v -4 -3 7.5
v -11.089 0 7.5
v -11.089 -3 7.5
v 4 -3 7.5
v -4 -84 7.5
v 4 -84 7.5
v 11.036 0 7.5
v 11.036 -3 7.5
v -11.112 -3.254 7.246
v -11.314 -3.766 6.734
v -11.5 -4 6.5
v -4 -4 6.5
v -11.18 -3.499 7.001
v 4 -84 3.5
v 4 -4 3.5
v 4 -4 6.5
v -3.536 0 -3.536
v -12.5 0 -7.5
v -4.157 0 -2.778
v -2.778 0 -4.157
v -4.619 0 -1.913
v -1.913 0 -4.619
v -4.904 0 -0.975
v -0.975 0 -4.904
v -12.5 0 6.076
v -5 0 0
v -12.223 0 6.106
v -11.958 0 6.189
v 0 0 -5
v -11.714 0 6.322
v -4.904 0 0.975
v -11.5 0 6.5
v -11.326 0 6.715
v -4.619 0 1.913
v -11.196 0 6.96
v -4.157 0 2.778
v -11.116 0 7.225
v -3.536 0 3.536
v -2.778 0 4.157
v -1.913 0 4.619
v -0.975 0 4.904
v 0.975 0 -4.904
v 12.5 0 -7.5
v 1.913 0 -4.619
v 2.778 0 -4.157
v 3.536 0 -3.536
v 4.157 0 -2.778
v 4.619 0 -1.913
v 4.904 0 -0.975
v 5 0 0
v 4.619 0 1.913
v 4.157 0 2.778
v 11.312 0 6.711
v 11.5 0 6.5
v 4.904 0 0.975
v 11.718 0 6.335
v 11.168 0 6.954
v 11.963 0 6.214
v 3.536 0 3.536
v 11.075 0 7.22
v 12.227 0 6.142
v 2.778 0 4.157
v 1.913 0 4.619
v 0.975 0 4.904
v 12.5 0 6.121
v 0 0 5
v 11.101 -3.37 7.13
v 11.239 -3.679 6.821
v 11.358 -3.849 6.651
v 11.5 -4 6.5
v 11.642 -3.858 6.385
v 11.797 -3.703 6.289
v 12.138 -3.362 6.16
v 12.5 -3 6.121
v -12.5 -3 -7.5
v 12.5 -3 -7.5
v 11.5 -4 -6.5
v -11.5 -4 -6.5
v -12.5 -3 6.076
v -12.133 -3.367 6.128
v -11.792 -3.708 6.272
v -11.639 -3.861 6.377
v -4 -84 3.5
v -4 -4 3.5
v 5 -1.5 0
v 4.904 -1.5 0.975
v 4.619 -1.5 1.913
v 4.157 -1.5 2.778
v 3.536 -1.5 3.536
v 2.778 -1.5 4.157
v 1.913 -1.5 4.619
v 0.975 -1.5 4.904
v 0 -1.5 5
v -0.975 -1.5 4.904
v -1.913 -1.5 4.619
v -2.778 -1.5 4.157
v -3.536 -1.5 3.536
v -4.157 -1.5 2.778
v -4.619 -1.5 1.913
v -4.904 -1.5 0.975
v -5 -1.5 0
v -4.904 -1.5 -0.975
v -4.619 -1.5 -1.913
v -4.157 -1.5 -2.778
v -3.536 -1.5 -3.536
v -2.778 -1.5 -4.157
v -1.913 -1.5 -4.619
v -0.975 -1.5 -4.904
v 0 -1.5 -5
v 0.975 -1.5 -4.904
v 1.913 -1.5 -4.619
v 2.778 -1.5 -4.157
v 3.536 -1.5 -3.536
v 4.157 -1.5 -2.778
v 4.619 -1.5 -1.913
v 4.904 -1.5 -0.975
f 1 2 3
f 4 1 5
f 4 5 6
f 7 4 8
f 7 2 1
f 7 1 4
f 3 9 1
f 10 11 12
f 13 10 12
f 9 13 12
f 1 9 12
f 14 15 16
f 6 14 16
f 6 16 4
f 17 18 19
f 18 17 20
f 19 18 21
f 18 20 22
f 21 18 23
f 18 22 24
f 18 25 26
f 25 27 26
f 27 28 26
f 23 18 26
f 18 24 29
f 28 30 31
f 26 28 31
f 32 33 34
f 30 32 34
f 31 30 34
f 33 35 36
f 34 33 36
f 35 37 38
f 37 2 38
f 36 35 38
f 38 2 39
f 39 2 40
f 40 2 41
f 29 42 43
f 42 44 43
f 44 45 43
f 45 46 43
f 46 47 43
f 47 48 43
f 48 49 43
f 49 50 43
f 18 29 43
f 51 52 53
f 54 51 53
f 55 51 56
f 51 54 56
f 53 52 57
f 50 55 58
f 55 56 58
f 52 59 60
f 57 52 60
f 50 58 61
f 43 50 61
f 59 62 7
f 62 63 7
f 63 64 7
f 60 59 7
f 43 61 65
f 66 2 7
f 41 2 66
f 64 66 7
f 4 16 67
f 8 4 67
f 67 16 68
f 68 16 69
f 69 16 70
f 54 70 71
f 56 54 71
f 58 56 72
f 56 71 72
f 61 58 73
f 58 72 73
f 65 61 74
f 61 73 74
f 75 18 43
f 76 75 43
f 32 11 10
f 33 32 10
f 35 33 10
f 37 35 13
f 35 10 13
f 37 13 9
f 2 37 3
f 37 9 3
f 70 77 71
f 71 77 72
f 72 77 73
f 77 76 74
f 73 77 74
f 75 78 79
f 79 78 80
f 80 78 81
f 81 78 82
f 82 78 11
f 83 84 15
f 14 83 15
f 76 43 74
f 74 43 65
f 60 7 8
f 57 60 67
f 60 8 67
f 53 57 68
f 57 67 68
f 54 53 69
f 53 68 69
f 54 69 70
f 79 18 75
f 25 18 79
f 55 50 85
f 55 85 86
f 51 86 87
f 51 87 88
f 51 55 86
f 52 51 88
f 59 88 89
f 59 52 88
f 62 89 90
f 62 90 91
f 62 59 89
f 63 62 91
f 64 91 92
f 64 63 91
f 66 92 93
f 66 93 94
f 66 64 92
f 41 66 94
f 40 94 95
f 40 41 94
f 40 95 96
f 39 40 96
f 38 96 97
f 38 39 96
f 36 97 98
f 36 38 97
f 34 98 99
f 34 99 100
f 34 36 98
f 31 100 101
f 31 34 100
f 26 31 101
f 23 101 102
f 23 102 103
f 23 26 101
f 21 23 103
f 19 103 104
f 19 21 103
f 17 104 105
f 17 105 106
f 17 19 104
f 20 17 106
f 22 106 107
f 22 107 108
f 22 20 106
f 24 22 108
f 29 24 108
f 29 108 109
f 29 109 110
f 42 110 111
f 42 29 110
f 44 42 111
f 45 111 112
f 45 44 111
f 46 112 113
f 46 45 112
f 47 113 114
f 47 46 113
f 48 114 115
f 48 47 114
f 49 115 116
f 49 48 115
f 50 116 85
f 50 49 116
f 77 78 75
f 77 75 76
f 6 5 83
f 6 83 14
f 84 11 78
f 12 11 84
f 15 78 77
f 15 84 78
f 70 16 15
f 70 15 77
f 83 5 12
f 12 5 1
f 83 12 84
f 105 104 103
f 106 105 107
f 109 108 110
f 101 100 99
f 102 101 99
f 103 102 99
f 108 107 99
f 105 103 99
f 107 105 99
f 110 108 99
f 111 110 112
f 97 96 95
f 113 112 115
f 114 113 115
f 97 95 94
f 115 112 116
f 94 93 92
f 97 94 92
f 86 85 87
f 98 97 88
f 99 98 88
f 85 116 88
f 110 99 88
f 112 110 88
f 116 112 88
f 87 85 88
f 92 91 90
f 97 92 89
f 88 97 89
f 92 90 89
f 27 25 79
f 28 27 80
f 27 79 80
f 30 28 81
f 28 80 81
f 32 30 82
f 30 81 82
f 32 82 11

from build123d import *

# Parameters (mm, degrees)
F0_W     = 25
F0_H     = 15
F1_DEPTH = 4
F2_R     = 5
F3_DEPTH = 1.5
F5_DEPTH = 80
F6_SIZE  = 1
F8_DEPTH = 25


with BuildPart() as f1:
    # F0 (on Front) → F1 (new body)
    with BuildSketch(Plane.XZ):
        Rectangle(F0_W, F0_H)
    extrude(amount=F1_DEPTH)

    # F2 (on Front) → F3 (cut)
    with BuildSketch(Plane.XZ):
        Circle(F2_R)
    extrude(amount=F3_DEPTH, mode=Mode.SUBTRACT)

    # F4 (on face) → F5 (join)
    with BuildSketch(Plane.XZ.offset(4)):
        Polygon((4, 7.5), (0, 7.5), (-4, 7.5), (-4, 3.5), (4, 3.5), align=None)
    extrude(amount=F5_DEPTH)

    # F6
    f6_edges = [f1.edges().sort_by_distance(p)[0] for p in [
        (8.25, -4, 7.5),
        (-8.25, -4, 7.5),
        (-12.5, -4, 0),
        (0, -4, -7.5),
        (12.5, -4, 0),
    ]]
    chamfer(f6_edges, length=F6_SIZE)

    # F7 (on face) → F8 (cut)
    with BuildSketch(Plane.XZ.offset(4)):
        with BuildLine():
            ThreePointArc((13.912691, 7.559422), (11.895218, 8.876943), (11.5, 6.5))
            ThreePointArc((11.5, 6.5), (13.052276, 6.241901), (13.912691, 7.559422))
        make_face()
        with BuildLine():
            ThreePointArc((-11.5, 6.5), (-11.196021, 6.959825), (-11.089372, 7.500628))
            ThreePointArc((-11.089372, 7.500628), (-13.831705, 8.041431), (-11.5, 6.5))
        make_face()
    extrude(amount=-F8_DEPTH, mode=Mode.SUBTRACT)


solid = f1.part
